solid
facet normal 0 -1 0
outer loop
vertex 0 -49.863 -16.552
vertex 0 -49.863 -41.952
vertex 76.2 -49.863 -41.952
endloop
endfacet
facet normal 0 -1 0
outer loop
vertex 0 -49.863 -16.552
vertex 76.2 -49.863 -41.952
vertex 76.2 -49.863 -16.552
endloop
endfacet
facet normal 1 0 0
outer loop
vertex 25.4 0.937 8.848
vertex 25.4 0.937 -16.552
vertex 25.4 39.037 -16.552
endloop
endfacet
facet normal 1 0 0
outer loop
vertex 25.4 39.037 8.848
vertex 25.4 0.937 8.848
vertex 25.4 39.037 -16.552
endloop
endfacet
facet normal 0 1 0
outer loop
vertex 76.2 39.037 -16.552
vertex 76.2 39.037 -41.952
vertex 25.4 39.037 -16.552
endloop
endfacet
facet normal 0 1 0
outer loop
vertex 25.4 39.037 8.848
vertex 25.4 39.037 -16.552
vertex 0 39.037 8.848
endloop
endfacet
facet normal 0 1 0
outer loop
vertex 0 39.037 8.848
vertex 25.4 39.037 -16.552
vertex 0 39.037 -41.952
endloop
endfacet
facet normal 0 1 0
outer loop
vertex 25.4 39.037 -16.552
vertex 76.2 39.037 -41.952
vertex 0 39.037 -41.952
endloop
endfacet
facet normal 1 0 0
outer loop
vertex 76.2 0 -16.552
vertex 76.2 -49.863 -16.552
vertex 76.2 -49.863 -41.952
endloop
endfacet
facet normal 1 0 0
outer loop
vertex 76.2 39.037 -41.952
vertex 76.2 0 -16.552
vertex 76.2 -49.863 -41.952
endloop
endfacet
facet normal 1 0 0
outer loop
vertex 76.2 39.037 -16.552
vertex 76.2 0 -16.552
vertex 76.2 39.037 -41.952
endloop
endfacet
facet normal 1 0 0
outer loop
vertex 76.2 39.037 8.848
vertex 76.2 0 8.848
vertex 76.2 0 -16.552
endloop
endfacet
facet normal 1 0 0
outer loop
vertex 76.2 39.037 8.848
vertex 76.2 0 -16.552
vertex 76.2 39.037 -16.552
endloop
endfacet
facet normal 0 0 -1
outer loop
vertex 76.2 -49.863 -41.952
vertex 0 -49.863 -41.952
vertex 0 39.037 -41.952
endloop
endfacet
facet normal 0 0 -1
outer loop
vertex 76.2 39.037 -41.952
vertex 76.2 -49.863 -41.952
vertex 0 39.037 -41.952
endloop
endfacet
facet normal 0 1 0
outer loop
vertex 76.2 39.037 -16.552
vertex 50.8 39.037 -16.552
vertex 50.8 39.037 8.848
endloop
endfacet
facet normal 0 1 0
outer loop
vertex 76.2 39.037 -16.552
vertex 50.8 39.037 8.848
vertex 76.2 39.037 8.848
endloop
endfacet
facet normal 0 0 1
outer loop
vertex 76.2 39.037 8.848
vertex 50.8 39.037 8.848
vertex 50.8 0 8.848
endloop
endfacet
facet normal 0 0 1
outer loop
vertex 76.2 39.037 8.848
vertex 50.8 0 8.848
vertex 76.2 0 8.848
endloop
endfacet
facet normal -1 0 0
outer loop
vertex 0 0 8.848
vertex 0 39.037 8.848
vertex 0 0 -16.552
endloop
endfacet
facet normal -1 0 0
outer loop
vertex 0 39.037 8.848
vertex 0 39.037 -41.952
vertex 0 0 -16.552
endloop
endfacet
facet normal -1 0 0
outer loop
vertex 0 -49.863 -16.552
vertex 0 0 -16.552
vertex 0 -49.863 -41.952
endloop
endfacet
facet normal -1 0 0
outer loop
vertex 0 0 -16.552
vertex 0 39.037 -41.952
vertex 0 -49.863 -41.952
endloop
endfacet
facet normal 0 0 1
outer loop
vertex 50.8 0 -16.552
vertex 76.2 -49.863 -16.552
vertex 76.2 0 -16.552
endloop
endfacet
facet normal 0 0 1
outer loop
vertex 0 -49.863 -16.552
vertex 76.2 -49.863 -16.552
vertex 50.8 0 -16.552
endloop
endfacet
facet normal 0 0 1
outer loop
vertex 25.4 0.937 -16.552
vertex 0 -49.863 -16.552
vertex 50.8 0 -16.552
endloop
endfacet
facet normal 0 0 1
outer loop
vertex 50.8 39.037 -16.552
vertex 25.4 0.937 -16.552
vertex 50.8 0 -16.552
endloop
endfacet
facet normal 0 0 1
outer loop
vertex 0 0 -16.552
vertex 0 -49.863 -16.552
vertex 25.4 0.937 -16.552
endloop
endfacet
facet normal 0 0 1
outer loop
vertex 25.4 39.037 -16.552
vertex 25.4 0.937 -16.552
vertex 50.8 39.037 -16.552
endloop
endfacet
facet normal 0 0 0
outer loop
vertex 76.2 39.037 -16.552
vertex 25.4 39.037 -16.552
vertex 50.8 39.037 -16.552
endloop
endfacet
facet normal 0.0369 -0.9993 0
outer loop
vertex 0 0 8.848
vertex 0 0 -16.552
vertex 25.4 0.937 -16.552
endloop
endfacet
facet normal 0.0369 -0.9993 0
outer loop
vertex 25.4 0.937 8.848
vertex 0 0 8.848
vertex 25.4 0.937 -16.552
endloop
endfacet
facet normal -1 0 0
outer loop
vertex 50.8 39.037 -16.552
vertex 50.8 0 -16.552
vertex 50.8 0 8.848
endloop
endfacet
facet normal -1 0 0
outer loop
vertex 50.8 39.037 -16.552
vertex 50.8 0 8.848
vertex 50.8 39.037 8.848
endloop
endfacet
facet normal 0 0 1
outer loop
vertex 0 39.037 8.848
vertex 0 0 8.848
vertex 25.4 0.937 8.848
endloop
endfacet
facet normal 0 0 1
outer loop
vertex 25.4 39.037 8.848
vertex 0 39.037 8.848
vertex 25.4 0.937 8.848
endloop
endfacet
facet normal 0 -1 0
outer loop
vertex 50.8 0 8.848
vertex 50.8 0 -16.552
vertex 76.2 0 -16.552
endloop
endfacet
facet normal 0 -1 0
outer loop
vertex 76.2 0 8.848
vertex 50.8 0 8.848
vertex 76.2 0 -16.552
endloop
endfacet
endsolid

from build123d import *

# Parameters (mm, degrees)
F0_W     = 88.9
F0_H     = 25.4
F1_DEPTH = 76.2
F3_DEPTH = 25.4
F4_W     = 25.4
F4_H     = 39.036911
F5_DEPTH = 25.4


with BuildPart() as f1:
    # F0 (on Right) → F1 (new body)
    with BuildSketch(Plane.YZ):
        with Locations((-5.413089, -29.252115)):
            Rectangle(F0_W, F0_H)
    extrude(amount=F1_DEPTH)

    # F2 (on face) → F3 (join)
    with BuildSketch(Plane.XY.offset(-16.552115)):
        Polygon((25.4, 39.036911), (0, 39.036911), (0, 0), (25.4, 0.936911), align=None)
    extrude(amount=F3_DEPTH)

    # F4 (on face) → F5 (join)
    with BuildSketch(Plane.XY.offset(-16.552115)):
        with Locations((63.5, 19.518455)):
            Rectangle(F4_W, F4_H)
    extrude(amount=F5_DEPTH)


solid = f1.part
